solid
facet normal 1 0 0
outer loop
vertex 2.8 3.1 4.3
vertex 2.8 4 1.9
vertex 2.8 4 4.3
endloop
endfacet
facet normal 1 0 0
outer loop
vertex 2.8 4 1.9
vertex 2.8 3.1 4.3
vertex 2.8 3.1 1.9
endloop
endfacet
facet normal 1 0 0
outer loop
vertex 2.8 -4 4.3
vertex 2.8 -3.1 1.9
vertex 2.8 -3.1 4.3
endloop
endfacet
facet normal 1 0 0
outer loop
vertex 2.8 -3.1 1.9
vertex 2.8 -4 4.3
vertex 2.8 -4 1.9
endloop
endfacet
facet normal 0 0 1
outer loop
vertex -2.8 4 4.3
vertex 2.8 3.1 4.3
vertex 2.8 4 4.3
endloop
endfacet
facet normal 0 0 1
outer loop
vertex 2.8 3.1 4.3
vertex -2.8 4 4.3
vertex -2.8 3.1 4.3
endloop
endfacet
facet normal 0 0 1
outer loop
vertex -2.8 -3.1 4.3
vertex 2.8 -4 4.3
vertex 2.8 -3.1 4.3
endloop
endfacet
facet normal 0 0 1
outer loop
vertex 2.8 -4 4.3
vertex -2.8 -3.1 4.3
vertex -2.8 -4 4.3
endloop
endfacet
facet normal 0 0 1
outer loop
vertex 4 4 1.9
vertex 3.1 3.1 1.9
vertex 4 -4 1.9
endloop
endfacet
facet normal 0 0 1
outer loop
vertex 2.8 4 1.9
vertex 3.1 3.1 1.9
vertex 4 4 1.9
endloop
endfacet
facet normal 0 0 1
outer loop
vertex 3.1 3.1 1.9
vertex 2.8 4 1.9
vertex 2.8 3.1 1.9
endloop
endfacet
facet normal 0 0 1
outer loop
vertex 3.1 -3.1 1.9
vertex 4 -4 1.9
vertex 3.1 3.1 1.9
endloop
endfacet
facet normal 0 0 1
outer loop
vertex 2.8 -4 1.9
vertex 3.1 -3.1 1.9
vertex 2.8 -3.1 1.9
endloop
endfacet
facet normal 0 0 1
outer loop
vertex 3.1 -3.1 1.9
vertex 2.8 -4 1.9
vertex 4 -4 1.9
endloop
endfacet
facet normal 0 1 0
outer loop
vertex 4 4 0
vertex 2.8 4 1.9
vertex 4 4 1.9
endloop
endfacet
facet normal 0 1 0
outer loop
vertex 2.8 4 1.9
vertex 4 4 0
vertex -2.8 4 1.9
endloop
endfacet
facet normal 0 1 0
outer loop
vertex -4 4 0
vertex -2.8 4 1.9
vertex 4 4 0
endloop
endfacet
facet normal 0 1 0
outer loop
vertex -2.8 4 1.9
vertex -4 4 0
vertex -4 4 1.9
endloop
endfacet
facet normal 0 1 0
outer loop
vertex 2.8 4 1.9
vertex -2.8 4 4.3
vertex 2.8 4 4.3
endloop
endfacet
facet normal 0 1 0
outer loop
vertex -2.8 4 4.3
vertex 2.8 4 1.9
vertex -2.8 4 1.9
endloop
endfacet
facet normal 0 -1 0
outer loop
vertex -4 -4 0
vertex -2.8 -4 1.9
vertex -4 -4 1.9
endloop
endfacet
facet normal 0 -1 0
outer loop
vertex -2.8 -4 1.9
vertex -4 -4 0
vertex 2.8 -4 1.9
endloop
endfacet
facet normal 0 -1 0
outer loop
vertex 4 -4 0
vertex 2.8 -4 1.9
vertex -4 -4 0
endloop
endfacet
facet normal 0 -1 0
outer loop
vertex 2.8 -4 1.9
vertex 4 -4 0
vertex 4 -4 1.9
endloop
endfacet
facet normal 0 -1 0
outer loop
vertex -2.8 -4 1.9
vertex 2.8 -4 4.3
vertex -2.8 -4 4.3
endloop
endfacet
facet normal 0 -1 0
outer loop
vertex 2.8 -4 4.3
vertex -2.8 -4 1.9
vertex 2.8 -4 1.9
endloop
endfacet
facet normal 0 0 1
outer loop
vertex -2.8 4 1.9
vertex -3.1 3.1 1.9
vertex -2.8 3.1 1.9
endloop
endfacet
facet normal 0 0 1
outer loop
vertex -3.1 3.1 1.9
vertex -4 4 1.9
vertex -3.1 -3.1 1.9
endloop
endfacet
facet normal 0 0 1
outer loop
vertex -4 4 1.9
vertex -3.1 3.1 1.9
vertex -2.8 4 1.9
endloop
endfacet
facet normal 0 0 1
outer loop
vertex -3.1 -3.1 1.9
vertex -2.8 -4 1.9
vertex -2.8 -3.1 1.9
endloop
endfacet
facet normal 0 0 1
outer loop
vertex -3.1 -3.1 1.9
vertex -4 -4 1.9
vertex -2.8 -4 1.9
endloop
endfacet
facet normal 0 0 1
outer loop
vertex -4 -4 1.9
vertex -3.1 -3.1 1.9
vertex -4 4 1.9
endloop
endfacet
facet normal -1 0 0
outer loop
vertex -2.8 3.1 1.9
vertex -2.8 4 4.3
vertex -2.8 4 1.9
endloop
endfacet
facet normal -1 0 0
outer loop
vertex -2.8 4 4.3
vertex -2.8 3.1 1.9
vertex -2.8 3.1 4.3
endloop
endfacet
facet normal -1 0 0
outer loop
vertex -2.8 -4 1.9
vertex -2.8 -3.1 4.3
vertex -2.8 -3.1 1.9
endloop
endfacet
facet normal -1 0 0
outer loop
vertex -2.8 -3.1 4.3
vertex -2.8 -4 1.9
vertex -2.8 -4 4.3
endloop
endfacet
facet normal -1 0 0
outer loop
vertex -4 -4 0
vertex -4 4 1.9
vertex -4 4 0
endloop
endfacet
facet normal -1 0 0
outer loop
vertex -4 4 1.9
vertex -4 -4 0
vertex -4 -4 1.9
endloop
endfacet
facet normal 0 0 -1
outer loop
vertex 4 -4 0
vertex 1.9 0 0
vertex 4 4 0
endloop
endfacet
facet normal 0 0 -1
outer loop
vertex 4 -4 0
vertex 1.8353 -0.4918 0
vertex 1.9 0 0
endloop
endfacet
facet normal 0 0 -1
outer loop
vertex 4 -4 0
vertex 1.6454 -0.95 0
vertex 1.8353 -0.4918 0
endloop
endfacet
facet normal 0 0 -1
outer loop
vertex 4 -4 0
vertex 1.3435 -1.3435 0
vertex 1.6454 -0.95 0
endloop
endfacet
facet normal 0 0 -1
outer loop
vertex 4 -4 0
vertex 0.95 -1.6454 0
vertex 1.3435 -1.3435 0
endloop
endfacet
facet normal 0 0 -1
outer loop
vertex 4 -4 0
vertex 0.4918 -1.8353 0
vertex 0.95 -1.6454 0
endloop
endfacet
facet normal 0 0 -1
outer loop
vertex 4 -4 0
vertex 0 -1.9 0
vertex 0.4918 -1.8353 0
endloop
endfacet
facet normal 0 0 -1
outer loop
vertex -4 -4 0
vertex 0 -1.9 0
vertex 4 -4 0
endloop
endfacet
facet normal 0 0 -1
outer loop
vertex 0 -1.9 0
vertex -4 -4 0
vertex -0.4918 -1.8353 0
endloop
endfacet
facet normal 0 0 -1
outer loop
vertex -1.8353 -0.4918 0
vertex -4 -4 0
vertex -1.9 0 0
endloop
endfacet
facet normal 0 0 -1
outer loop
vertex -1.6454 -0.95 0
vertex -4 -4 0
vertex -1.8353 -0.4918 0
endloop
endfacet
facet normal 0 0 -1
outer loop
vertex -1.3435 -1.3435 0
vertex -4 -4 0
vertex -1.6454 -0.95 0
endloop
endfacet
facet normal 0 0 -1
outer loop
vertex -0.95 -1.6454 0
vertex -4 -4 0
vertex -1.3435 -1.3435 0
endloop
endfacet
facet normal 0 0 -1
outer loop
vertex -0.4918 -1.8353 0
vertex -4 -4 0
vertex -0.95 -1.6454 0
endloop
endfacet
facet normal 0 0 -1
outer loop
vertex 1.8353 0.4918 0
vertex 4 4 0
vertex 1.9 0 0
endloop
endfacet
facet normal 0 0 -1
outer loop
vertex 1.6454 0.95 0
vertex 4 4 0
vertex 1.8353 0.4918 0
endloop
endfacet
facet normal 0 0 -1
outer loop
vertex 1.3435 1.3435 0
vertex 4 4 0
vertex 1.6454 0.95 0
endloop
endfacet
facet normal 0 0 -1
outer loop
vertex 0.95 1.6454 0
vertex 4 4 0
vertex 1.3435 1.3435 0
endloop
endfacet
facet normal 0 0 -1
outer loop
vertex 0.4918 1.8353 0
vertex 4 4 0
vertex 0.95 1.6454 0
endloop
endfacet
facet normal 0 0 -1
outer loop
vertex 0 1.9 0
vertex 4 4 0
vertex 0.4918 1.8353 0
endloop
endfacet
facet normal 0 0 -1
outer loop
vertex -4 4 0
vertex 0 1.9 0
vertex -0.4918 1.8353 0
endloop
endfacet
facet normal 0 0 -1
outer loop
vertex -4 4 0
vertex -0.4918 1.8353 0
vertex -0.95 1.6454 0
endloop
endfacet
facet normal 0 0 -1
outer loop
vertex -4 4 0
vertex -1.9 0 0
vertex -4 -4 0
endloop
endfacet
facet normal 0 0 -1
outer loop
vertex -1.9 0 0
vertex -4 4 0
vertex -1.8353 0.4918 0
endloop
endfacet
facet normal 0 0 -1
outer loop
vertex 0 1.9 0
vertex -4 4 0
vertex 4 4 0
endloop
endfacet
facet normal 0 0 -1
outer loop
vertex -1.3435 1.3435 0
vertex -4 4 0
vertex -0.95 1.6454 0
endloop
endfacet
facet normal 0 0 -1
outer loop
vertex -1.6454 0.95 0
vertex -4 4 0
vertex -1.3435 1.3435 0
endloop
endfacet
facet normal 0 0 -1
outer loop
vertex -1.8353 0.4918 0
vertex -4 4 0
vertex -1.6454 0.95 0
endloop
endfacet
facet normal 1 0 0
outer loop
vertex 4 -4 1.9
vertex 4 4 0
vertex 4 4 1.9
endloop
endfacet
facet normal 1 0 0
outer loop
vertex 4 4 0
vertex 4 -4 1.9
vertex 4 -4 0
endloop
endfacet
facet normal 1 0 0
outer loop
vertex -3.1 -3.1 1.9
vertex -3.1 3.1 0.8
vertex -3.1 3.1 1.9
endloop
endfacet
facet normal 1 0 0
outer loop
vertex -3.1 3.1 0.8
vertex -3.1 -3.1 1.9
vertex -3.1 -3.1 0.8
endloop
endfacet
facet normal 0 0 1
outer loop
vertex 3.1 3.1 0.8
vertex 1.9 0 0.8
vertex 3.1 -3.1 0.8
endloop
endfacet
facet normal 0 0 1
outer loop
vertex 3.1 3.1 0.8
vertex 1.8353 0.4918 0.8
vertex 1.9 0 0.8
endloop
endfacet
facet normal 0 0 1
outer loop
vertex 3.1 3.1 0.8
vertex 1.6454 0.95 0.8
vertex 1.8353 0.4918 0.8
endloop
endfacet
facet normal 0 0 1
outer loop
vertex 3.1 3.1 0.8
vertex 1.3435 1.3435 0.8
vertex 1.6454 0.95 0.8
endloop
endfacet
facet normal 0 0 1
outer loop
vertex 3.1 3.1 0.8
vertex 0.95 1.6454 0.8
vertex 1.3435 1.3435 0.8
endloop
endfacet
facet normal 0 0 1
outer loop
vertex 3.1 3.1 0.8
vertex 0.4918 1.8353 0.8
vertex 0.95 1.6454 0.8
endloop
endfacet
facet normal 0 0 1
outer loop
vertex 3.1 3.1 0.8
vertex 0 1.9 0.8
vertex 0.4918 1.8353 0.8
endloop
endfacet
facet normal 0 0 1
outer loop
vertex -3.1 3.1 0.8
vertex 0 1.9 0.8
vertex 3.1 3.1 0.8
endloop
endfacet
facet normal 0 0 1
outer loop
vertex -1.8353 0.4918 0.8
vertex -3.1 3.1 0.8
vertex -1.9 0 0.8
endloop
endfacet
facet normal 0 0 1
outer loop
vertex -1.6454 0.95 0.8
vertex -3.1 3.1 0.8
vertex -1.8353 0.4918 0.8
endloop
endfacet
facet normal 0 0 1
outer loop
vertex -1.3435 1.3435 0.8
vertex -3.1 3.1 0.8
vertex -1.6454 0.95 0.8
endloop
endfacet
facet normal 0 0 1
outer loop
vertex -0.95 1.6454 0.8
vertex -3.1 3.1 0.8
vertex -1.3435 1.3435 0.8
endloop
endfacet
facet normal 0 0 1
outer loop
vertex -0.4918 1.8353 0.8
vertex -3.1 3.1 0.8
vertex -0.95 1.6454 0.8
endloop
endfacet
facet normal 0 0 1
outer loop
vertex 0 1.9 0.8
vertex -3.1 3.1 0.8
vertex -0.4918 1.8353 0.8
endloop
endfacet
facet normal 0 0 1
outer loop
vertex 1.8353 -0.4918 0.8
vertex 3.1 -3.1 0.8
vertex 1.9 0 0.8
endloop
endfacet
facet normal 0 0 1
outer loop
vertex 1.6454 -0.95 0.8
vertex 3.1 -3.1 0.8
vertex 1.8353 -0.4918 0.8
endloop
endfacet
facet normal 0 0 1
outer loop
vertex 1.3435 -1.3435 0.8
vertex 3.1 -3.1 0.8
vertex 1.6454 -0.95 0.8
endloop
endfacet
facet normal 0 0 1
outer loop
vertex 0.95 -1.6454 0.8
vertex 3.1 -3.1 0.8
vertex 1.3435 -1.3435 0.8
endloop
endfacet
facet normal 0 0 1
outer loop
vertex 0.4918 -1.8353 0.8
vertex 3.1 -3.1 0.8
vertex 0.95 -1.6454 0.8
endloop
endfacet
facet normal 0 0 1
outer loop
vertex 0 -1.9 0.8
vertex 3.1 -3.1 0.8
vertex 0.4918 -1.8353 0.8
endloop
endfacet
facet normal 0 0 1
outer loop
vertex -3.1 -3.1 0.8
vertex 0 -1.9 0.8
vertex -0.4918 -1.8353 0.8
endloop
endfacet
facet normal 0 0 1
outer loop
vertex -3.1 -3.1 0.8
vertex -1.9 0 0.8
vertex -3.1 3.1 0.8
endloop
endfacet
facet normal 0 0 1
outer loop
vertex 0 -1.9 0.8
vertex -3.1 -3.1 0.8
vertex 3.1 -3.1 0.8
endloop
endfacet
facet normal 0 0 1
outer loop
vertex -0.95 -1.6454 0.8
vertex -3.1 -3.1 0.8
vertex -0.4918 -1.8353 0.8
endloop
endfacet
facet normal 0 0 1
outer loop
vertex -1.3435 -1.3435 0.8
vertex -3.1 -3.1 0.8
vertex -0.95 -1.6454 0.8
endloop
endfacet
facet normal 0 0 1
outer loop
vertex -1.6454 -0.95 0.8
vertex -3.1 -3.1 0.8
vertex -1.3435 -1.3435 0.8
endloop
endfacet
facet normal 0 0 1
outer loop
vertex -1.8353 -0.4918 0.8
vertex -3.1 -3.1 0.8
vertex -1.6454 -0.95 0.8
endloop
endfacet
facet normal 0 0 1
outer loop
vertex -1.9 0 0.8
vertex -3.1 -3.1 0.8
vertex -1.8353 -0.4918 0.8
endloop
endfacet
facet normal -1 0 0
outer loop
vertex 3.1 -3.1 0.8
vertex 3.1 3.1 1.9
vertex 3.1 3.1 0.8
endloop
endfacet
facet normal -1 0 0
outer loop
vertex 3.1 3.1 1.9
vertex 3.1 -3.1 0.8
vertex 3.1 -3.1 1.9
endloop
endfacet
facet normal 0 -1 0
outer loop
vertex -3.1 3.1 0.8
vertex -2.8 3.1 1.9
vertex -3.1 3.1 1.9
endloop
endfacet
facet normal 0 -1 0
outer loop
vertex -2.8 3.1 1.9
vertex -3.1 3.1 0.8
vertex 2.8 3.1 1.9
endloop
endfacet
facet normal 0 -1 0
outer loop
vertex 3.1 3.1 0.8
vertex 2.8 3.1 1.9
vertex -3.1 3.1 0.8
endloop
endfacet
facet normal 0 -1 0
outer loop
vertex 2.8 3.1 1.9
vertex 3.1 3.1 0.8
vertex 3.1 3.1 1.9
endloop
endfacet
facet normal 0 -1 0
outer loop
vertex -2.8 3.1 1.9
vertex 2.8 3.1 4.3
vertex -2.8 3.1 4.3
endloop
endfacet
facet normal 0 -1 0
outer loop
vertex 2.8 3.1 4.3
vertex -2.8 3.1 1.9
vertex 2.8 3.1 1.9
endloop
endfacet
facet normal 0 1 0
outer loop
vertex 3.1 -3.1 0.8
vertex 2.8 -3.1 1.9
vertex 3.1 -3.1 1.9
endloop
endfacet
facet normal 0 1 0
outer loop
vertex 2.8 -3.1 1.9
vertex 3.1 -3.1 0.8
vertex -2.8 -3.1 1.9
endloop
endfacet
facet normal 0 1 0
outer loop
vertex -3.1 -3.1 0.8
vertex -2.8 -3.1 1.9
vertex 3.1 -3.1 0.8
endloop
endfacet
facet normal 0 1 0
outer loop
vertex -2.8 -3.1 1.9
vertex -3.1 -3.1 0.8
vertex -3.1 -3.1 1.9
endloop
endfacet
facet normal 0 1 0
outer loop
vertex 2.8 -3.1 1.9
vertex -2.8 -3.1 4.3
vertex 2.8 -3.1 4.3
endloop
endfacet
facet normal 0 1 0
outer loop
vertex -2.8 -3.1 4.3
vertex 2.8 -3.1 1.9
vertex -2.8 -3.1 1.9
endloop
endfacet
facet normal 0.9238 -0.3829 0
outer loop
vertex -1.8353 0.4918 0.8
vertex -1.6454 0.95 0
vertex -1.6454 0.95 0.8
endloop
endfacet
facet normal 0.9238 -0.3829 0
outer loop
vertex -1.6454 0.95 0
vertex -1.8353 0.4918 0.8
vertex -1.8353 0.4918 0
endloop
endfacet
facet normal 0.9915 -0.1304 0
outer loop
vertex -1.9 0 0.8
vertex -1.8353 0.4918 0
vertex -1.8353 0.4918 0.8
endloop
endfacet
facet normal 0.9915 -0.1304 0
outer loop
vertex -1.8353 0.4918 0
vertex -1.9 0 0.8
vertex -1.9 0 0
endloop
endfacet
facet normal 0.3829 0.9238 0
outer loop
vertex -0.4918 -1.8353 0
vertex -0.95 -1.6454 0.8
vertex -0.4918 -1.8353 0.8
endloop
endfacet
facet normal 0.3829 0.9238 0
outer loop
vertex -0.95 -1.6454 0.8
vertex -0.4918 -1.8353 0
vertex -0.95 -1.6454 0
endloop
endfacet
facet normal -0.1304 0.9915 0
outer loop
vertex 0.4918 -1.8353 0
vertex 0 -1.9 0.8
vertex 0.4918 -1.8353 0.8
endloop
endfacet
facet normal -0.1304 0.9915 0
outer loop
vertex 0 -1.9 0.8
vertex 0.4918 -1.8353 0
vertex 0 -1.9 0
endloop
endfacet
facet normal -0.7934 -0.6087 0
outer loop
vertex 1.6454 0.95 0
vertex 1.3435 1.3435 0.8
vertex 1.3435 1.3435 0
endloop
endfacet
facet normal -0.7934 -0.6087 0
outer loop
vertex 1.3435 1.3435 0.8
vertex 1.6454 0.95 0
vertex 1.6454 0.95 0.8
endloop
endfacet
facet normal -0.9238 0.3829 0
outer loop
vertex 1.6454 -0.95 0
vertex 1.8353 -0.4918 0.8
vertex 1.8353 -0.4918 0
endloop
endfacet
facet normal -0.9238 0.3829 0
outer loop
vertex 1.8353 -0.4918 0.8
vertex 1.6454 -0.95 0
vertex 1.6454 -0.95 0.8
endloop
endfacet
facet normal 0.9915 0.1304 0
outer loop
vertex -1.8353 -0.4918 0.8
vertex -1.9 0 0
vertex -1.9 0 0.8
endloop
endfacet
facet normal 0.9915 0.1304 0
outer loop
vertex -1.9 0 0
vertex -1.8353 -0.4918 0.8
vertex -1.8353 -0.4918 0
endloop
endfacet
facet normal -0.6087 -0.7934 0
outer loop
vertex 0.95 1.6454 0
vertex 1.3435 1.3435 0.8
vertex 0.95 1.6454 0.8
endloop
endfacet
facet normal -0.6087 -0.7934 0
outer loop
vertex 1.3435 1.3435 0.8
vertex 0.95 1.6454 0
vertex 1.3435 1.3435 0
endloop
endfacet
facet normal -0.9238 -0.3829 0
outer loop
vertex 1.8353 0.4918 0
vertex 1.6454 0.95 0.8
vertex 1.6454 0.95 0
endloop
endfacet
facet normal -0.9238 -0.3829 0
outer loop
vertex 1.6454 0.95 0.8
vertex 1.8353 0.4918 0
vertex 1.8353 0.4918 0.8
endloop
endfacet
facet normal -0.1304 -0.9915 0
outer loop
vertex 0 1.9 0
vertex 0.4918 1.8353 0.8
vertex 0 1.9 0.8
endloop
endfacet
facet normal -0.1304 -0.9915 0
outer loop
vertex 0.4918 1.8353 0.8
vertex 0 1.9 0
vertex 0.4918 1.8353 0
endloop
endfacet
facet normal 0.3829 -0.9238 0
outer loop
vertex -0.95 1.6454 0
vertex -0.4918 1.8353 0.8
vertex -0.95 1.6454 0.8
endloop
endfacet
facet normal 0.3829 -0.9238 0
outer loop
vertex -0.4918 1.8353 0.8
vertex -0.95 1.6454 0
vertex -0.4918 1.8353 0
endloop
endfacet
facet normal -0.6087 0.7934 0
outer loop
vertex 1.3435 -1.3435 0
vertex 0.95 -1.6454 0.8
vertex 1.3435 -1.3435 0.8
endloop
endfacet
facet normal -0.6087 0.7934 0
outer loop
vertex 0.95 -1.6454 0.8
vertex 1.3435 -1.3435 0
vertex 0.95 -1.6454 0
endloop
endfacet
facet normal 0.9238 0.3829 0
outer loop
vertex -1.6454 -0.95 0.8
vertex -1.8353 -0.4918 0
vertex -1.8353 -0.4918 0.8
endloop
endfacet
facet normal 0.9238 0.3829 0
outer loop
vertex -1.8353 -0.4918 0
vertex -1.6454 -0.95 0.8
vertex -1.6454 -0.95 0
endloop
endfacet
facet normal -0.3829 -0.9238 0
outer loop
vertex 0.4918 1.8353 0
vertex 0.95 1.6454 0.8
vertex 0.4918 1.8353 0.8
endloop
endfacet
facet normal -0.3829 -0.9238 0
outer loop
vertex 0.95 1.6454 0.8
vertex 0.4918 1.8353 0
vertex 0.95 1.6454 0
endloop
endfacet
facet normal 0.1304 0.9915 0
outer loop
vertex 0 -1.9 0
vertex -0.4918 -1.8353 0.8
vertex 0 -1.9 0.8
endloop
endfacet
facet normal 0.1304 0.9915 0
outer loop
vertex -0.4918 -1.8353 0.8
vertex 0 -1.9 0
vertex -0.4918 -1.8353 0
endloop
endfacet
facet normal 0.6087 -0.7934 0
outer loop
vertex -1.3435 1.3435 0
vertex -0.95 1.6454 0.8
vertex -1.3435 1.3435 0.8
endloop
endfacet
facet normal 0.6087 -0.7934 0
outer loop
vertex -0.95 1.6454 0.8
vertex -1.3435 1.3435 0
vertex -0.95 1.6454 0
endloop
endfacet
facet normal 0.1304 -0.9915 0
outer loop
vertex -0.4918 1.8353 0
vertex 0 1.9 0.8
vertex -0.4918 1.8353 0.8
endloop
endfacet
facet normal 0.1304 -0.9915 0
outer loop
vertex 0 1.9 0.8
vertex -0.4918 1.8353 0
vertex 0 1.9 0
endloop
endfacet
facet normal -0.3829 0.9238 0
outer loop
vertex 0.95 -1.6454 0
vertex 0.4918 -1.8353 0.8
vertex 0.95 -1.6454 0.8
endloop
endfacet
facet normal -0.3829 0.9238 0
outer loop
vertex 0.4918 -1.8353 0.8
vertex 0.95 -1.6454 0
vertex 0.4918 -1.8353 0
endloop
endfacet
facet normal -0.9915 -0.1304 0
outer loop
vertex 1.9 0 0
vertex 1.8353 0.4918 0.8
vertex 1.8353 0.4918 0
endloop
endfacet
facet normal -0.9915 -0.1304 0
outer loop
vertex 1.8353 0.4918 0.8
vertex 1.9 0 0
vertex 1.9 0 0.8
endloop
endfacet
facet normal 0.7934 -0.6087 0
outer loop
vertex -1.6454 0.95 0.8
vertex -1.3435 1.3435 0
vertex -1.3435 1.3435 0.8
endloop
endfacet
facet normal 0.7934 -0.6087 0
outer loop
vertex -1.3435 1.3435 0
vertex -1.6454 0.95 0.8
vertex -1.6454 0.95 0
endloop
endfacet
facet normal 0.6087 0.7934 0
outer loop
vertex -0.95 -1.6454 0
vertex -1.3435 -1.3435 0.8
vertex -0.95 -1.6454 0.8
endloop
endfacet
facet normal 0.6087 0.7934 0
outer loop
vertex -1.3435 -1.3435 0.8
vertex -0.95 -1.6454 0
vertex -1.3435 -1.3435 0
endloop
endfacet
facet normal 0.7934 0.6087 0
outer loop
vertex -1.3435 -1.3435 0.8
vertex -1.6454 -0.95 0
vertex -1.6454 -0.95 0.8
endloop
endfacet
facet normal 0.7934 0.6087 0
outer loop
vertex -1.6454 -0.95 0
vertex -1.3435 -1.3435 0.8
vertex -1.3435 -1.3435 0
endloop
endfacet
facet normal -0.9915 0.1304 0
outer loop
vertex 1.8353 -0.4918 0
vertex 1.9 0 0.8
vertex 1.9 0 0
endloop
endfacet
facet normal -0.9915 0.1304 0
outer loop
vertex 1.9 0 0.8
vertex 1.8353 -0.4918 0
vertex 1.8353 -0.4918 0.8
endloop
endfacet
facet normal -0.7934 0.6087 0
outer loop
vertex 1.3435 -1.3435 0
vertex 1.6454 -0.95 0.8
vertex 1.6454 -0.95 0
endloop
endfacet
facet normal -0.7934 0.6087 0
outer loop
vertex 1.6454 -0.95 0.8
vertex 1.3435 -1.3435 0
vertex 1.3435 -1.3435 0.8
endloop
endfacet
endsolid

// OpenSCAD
include <../lib/eink-dual-lora-case-lib.scad>;
$fn = 40;
front_cradle_part();
